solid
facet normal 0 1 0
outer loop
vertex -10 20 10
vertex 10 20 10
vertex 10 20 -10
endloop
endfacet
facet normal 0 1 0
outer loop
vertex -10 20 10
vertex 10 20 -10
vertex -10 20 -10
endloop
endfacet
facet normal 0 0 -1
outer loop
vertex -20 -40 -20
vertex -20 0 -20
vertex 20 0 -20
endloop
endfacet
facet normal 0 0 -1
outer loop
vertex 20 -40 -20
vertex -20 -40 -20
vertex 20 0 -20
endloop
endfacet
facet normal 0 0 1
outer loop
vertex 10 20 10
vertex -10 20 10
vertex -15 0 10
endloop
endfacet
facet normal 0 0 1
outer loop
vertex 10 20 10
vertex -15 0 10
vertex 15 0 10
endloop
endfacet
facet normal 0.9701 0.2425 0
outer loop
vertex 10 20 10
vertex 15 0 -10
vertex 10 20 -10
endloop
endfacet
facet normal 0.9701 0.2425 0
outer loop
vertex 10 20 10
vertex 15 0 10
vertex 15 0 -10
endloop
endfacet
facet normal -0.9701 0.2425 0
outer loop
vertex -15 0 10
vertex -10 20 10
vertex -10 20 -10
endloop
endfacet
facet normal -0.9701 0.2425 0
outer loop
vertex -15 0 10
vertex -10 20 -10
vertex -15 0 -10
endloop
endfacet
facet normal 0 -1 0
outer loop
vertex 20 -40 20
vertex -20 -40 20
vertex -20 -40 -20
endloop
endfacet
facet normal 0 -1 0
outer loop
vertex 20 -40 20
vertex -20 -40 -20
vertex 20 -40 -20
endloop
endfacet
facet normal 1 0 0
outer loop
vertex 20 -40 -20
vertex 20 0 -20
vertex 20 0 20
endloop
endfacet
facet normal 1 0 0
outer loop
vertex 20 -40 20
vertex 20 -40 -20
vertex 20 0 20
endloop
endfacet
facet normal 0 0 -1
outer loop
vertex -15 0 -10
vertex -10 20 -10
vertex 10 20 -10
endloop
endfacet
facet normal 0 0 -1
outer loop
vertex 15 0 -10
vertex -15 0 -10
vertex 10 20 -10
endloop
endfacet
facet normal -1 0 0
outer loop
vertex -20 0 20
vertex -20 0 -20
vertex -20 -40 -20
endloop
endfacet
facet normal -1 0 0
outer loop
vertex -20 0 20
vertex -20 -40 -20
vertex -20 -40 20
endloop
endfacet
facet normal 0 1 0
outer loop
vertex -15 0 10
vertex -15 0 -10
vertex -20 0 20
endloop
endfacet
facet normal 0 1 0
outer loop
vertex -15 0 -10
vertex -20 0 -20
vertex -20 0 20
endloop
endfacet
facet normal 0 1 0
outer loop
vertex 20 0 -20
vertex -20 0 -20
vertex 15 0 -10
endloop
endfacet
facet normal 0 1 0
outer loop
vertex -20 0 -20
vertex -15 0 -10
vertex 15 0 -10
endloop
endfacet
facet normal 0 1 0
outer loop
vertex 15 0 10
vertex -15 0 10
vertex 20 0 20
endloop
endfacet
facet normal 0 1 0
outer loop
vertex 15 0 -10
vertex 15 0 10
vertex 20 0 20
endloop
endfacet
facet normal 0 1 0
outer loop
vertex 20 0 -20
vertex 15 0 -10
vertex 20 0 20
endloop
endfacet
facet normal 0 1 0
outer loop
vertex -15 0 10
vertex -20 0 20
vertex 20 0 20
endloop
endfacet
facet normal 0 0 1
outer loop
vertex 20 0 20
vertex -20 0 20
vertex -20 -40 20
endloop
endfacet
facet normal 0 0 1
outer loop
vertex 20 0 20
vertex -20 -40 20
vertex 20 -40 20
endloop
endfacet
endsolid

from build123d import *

# Parameters (mm, degrees)
F0_W     = 40
F0_H     = 40
F1_DEPTH = 40
F3_DEPTH = 10


with BuildPart() as f1:
    # F0 (on Front) → F1 (new body)
    with BuildSketch(Plane.XZ):
        Rectangle(F0_W, F0_H)
    extrude(amount=F1_DEPTH)

    # F2 (on Top) → F3 (join, symmetric)
    with BuildSketch(Plane.XY):
        Polygon((0, 0), (15, 0), (10, 20), (0, 20), align=None)
        Polygon((-15, 0), (0, 0), (0, 20), (-10, 20), align=None)
    extrude(amount=F3_DEPTH, both=True)


solid = f1.part
